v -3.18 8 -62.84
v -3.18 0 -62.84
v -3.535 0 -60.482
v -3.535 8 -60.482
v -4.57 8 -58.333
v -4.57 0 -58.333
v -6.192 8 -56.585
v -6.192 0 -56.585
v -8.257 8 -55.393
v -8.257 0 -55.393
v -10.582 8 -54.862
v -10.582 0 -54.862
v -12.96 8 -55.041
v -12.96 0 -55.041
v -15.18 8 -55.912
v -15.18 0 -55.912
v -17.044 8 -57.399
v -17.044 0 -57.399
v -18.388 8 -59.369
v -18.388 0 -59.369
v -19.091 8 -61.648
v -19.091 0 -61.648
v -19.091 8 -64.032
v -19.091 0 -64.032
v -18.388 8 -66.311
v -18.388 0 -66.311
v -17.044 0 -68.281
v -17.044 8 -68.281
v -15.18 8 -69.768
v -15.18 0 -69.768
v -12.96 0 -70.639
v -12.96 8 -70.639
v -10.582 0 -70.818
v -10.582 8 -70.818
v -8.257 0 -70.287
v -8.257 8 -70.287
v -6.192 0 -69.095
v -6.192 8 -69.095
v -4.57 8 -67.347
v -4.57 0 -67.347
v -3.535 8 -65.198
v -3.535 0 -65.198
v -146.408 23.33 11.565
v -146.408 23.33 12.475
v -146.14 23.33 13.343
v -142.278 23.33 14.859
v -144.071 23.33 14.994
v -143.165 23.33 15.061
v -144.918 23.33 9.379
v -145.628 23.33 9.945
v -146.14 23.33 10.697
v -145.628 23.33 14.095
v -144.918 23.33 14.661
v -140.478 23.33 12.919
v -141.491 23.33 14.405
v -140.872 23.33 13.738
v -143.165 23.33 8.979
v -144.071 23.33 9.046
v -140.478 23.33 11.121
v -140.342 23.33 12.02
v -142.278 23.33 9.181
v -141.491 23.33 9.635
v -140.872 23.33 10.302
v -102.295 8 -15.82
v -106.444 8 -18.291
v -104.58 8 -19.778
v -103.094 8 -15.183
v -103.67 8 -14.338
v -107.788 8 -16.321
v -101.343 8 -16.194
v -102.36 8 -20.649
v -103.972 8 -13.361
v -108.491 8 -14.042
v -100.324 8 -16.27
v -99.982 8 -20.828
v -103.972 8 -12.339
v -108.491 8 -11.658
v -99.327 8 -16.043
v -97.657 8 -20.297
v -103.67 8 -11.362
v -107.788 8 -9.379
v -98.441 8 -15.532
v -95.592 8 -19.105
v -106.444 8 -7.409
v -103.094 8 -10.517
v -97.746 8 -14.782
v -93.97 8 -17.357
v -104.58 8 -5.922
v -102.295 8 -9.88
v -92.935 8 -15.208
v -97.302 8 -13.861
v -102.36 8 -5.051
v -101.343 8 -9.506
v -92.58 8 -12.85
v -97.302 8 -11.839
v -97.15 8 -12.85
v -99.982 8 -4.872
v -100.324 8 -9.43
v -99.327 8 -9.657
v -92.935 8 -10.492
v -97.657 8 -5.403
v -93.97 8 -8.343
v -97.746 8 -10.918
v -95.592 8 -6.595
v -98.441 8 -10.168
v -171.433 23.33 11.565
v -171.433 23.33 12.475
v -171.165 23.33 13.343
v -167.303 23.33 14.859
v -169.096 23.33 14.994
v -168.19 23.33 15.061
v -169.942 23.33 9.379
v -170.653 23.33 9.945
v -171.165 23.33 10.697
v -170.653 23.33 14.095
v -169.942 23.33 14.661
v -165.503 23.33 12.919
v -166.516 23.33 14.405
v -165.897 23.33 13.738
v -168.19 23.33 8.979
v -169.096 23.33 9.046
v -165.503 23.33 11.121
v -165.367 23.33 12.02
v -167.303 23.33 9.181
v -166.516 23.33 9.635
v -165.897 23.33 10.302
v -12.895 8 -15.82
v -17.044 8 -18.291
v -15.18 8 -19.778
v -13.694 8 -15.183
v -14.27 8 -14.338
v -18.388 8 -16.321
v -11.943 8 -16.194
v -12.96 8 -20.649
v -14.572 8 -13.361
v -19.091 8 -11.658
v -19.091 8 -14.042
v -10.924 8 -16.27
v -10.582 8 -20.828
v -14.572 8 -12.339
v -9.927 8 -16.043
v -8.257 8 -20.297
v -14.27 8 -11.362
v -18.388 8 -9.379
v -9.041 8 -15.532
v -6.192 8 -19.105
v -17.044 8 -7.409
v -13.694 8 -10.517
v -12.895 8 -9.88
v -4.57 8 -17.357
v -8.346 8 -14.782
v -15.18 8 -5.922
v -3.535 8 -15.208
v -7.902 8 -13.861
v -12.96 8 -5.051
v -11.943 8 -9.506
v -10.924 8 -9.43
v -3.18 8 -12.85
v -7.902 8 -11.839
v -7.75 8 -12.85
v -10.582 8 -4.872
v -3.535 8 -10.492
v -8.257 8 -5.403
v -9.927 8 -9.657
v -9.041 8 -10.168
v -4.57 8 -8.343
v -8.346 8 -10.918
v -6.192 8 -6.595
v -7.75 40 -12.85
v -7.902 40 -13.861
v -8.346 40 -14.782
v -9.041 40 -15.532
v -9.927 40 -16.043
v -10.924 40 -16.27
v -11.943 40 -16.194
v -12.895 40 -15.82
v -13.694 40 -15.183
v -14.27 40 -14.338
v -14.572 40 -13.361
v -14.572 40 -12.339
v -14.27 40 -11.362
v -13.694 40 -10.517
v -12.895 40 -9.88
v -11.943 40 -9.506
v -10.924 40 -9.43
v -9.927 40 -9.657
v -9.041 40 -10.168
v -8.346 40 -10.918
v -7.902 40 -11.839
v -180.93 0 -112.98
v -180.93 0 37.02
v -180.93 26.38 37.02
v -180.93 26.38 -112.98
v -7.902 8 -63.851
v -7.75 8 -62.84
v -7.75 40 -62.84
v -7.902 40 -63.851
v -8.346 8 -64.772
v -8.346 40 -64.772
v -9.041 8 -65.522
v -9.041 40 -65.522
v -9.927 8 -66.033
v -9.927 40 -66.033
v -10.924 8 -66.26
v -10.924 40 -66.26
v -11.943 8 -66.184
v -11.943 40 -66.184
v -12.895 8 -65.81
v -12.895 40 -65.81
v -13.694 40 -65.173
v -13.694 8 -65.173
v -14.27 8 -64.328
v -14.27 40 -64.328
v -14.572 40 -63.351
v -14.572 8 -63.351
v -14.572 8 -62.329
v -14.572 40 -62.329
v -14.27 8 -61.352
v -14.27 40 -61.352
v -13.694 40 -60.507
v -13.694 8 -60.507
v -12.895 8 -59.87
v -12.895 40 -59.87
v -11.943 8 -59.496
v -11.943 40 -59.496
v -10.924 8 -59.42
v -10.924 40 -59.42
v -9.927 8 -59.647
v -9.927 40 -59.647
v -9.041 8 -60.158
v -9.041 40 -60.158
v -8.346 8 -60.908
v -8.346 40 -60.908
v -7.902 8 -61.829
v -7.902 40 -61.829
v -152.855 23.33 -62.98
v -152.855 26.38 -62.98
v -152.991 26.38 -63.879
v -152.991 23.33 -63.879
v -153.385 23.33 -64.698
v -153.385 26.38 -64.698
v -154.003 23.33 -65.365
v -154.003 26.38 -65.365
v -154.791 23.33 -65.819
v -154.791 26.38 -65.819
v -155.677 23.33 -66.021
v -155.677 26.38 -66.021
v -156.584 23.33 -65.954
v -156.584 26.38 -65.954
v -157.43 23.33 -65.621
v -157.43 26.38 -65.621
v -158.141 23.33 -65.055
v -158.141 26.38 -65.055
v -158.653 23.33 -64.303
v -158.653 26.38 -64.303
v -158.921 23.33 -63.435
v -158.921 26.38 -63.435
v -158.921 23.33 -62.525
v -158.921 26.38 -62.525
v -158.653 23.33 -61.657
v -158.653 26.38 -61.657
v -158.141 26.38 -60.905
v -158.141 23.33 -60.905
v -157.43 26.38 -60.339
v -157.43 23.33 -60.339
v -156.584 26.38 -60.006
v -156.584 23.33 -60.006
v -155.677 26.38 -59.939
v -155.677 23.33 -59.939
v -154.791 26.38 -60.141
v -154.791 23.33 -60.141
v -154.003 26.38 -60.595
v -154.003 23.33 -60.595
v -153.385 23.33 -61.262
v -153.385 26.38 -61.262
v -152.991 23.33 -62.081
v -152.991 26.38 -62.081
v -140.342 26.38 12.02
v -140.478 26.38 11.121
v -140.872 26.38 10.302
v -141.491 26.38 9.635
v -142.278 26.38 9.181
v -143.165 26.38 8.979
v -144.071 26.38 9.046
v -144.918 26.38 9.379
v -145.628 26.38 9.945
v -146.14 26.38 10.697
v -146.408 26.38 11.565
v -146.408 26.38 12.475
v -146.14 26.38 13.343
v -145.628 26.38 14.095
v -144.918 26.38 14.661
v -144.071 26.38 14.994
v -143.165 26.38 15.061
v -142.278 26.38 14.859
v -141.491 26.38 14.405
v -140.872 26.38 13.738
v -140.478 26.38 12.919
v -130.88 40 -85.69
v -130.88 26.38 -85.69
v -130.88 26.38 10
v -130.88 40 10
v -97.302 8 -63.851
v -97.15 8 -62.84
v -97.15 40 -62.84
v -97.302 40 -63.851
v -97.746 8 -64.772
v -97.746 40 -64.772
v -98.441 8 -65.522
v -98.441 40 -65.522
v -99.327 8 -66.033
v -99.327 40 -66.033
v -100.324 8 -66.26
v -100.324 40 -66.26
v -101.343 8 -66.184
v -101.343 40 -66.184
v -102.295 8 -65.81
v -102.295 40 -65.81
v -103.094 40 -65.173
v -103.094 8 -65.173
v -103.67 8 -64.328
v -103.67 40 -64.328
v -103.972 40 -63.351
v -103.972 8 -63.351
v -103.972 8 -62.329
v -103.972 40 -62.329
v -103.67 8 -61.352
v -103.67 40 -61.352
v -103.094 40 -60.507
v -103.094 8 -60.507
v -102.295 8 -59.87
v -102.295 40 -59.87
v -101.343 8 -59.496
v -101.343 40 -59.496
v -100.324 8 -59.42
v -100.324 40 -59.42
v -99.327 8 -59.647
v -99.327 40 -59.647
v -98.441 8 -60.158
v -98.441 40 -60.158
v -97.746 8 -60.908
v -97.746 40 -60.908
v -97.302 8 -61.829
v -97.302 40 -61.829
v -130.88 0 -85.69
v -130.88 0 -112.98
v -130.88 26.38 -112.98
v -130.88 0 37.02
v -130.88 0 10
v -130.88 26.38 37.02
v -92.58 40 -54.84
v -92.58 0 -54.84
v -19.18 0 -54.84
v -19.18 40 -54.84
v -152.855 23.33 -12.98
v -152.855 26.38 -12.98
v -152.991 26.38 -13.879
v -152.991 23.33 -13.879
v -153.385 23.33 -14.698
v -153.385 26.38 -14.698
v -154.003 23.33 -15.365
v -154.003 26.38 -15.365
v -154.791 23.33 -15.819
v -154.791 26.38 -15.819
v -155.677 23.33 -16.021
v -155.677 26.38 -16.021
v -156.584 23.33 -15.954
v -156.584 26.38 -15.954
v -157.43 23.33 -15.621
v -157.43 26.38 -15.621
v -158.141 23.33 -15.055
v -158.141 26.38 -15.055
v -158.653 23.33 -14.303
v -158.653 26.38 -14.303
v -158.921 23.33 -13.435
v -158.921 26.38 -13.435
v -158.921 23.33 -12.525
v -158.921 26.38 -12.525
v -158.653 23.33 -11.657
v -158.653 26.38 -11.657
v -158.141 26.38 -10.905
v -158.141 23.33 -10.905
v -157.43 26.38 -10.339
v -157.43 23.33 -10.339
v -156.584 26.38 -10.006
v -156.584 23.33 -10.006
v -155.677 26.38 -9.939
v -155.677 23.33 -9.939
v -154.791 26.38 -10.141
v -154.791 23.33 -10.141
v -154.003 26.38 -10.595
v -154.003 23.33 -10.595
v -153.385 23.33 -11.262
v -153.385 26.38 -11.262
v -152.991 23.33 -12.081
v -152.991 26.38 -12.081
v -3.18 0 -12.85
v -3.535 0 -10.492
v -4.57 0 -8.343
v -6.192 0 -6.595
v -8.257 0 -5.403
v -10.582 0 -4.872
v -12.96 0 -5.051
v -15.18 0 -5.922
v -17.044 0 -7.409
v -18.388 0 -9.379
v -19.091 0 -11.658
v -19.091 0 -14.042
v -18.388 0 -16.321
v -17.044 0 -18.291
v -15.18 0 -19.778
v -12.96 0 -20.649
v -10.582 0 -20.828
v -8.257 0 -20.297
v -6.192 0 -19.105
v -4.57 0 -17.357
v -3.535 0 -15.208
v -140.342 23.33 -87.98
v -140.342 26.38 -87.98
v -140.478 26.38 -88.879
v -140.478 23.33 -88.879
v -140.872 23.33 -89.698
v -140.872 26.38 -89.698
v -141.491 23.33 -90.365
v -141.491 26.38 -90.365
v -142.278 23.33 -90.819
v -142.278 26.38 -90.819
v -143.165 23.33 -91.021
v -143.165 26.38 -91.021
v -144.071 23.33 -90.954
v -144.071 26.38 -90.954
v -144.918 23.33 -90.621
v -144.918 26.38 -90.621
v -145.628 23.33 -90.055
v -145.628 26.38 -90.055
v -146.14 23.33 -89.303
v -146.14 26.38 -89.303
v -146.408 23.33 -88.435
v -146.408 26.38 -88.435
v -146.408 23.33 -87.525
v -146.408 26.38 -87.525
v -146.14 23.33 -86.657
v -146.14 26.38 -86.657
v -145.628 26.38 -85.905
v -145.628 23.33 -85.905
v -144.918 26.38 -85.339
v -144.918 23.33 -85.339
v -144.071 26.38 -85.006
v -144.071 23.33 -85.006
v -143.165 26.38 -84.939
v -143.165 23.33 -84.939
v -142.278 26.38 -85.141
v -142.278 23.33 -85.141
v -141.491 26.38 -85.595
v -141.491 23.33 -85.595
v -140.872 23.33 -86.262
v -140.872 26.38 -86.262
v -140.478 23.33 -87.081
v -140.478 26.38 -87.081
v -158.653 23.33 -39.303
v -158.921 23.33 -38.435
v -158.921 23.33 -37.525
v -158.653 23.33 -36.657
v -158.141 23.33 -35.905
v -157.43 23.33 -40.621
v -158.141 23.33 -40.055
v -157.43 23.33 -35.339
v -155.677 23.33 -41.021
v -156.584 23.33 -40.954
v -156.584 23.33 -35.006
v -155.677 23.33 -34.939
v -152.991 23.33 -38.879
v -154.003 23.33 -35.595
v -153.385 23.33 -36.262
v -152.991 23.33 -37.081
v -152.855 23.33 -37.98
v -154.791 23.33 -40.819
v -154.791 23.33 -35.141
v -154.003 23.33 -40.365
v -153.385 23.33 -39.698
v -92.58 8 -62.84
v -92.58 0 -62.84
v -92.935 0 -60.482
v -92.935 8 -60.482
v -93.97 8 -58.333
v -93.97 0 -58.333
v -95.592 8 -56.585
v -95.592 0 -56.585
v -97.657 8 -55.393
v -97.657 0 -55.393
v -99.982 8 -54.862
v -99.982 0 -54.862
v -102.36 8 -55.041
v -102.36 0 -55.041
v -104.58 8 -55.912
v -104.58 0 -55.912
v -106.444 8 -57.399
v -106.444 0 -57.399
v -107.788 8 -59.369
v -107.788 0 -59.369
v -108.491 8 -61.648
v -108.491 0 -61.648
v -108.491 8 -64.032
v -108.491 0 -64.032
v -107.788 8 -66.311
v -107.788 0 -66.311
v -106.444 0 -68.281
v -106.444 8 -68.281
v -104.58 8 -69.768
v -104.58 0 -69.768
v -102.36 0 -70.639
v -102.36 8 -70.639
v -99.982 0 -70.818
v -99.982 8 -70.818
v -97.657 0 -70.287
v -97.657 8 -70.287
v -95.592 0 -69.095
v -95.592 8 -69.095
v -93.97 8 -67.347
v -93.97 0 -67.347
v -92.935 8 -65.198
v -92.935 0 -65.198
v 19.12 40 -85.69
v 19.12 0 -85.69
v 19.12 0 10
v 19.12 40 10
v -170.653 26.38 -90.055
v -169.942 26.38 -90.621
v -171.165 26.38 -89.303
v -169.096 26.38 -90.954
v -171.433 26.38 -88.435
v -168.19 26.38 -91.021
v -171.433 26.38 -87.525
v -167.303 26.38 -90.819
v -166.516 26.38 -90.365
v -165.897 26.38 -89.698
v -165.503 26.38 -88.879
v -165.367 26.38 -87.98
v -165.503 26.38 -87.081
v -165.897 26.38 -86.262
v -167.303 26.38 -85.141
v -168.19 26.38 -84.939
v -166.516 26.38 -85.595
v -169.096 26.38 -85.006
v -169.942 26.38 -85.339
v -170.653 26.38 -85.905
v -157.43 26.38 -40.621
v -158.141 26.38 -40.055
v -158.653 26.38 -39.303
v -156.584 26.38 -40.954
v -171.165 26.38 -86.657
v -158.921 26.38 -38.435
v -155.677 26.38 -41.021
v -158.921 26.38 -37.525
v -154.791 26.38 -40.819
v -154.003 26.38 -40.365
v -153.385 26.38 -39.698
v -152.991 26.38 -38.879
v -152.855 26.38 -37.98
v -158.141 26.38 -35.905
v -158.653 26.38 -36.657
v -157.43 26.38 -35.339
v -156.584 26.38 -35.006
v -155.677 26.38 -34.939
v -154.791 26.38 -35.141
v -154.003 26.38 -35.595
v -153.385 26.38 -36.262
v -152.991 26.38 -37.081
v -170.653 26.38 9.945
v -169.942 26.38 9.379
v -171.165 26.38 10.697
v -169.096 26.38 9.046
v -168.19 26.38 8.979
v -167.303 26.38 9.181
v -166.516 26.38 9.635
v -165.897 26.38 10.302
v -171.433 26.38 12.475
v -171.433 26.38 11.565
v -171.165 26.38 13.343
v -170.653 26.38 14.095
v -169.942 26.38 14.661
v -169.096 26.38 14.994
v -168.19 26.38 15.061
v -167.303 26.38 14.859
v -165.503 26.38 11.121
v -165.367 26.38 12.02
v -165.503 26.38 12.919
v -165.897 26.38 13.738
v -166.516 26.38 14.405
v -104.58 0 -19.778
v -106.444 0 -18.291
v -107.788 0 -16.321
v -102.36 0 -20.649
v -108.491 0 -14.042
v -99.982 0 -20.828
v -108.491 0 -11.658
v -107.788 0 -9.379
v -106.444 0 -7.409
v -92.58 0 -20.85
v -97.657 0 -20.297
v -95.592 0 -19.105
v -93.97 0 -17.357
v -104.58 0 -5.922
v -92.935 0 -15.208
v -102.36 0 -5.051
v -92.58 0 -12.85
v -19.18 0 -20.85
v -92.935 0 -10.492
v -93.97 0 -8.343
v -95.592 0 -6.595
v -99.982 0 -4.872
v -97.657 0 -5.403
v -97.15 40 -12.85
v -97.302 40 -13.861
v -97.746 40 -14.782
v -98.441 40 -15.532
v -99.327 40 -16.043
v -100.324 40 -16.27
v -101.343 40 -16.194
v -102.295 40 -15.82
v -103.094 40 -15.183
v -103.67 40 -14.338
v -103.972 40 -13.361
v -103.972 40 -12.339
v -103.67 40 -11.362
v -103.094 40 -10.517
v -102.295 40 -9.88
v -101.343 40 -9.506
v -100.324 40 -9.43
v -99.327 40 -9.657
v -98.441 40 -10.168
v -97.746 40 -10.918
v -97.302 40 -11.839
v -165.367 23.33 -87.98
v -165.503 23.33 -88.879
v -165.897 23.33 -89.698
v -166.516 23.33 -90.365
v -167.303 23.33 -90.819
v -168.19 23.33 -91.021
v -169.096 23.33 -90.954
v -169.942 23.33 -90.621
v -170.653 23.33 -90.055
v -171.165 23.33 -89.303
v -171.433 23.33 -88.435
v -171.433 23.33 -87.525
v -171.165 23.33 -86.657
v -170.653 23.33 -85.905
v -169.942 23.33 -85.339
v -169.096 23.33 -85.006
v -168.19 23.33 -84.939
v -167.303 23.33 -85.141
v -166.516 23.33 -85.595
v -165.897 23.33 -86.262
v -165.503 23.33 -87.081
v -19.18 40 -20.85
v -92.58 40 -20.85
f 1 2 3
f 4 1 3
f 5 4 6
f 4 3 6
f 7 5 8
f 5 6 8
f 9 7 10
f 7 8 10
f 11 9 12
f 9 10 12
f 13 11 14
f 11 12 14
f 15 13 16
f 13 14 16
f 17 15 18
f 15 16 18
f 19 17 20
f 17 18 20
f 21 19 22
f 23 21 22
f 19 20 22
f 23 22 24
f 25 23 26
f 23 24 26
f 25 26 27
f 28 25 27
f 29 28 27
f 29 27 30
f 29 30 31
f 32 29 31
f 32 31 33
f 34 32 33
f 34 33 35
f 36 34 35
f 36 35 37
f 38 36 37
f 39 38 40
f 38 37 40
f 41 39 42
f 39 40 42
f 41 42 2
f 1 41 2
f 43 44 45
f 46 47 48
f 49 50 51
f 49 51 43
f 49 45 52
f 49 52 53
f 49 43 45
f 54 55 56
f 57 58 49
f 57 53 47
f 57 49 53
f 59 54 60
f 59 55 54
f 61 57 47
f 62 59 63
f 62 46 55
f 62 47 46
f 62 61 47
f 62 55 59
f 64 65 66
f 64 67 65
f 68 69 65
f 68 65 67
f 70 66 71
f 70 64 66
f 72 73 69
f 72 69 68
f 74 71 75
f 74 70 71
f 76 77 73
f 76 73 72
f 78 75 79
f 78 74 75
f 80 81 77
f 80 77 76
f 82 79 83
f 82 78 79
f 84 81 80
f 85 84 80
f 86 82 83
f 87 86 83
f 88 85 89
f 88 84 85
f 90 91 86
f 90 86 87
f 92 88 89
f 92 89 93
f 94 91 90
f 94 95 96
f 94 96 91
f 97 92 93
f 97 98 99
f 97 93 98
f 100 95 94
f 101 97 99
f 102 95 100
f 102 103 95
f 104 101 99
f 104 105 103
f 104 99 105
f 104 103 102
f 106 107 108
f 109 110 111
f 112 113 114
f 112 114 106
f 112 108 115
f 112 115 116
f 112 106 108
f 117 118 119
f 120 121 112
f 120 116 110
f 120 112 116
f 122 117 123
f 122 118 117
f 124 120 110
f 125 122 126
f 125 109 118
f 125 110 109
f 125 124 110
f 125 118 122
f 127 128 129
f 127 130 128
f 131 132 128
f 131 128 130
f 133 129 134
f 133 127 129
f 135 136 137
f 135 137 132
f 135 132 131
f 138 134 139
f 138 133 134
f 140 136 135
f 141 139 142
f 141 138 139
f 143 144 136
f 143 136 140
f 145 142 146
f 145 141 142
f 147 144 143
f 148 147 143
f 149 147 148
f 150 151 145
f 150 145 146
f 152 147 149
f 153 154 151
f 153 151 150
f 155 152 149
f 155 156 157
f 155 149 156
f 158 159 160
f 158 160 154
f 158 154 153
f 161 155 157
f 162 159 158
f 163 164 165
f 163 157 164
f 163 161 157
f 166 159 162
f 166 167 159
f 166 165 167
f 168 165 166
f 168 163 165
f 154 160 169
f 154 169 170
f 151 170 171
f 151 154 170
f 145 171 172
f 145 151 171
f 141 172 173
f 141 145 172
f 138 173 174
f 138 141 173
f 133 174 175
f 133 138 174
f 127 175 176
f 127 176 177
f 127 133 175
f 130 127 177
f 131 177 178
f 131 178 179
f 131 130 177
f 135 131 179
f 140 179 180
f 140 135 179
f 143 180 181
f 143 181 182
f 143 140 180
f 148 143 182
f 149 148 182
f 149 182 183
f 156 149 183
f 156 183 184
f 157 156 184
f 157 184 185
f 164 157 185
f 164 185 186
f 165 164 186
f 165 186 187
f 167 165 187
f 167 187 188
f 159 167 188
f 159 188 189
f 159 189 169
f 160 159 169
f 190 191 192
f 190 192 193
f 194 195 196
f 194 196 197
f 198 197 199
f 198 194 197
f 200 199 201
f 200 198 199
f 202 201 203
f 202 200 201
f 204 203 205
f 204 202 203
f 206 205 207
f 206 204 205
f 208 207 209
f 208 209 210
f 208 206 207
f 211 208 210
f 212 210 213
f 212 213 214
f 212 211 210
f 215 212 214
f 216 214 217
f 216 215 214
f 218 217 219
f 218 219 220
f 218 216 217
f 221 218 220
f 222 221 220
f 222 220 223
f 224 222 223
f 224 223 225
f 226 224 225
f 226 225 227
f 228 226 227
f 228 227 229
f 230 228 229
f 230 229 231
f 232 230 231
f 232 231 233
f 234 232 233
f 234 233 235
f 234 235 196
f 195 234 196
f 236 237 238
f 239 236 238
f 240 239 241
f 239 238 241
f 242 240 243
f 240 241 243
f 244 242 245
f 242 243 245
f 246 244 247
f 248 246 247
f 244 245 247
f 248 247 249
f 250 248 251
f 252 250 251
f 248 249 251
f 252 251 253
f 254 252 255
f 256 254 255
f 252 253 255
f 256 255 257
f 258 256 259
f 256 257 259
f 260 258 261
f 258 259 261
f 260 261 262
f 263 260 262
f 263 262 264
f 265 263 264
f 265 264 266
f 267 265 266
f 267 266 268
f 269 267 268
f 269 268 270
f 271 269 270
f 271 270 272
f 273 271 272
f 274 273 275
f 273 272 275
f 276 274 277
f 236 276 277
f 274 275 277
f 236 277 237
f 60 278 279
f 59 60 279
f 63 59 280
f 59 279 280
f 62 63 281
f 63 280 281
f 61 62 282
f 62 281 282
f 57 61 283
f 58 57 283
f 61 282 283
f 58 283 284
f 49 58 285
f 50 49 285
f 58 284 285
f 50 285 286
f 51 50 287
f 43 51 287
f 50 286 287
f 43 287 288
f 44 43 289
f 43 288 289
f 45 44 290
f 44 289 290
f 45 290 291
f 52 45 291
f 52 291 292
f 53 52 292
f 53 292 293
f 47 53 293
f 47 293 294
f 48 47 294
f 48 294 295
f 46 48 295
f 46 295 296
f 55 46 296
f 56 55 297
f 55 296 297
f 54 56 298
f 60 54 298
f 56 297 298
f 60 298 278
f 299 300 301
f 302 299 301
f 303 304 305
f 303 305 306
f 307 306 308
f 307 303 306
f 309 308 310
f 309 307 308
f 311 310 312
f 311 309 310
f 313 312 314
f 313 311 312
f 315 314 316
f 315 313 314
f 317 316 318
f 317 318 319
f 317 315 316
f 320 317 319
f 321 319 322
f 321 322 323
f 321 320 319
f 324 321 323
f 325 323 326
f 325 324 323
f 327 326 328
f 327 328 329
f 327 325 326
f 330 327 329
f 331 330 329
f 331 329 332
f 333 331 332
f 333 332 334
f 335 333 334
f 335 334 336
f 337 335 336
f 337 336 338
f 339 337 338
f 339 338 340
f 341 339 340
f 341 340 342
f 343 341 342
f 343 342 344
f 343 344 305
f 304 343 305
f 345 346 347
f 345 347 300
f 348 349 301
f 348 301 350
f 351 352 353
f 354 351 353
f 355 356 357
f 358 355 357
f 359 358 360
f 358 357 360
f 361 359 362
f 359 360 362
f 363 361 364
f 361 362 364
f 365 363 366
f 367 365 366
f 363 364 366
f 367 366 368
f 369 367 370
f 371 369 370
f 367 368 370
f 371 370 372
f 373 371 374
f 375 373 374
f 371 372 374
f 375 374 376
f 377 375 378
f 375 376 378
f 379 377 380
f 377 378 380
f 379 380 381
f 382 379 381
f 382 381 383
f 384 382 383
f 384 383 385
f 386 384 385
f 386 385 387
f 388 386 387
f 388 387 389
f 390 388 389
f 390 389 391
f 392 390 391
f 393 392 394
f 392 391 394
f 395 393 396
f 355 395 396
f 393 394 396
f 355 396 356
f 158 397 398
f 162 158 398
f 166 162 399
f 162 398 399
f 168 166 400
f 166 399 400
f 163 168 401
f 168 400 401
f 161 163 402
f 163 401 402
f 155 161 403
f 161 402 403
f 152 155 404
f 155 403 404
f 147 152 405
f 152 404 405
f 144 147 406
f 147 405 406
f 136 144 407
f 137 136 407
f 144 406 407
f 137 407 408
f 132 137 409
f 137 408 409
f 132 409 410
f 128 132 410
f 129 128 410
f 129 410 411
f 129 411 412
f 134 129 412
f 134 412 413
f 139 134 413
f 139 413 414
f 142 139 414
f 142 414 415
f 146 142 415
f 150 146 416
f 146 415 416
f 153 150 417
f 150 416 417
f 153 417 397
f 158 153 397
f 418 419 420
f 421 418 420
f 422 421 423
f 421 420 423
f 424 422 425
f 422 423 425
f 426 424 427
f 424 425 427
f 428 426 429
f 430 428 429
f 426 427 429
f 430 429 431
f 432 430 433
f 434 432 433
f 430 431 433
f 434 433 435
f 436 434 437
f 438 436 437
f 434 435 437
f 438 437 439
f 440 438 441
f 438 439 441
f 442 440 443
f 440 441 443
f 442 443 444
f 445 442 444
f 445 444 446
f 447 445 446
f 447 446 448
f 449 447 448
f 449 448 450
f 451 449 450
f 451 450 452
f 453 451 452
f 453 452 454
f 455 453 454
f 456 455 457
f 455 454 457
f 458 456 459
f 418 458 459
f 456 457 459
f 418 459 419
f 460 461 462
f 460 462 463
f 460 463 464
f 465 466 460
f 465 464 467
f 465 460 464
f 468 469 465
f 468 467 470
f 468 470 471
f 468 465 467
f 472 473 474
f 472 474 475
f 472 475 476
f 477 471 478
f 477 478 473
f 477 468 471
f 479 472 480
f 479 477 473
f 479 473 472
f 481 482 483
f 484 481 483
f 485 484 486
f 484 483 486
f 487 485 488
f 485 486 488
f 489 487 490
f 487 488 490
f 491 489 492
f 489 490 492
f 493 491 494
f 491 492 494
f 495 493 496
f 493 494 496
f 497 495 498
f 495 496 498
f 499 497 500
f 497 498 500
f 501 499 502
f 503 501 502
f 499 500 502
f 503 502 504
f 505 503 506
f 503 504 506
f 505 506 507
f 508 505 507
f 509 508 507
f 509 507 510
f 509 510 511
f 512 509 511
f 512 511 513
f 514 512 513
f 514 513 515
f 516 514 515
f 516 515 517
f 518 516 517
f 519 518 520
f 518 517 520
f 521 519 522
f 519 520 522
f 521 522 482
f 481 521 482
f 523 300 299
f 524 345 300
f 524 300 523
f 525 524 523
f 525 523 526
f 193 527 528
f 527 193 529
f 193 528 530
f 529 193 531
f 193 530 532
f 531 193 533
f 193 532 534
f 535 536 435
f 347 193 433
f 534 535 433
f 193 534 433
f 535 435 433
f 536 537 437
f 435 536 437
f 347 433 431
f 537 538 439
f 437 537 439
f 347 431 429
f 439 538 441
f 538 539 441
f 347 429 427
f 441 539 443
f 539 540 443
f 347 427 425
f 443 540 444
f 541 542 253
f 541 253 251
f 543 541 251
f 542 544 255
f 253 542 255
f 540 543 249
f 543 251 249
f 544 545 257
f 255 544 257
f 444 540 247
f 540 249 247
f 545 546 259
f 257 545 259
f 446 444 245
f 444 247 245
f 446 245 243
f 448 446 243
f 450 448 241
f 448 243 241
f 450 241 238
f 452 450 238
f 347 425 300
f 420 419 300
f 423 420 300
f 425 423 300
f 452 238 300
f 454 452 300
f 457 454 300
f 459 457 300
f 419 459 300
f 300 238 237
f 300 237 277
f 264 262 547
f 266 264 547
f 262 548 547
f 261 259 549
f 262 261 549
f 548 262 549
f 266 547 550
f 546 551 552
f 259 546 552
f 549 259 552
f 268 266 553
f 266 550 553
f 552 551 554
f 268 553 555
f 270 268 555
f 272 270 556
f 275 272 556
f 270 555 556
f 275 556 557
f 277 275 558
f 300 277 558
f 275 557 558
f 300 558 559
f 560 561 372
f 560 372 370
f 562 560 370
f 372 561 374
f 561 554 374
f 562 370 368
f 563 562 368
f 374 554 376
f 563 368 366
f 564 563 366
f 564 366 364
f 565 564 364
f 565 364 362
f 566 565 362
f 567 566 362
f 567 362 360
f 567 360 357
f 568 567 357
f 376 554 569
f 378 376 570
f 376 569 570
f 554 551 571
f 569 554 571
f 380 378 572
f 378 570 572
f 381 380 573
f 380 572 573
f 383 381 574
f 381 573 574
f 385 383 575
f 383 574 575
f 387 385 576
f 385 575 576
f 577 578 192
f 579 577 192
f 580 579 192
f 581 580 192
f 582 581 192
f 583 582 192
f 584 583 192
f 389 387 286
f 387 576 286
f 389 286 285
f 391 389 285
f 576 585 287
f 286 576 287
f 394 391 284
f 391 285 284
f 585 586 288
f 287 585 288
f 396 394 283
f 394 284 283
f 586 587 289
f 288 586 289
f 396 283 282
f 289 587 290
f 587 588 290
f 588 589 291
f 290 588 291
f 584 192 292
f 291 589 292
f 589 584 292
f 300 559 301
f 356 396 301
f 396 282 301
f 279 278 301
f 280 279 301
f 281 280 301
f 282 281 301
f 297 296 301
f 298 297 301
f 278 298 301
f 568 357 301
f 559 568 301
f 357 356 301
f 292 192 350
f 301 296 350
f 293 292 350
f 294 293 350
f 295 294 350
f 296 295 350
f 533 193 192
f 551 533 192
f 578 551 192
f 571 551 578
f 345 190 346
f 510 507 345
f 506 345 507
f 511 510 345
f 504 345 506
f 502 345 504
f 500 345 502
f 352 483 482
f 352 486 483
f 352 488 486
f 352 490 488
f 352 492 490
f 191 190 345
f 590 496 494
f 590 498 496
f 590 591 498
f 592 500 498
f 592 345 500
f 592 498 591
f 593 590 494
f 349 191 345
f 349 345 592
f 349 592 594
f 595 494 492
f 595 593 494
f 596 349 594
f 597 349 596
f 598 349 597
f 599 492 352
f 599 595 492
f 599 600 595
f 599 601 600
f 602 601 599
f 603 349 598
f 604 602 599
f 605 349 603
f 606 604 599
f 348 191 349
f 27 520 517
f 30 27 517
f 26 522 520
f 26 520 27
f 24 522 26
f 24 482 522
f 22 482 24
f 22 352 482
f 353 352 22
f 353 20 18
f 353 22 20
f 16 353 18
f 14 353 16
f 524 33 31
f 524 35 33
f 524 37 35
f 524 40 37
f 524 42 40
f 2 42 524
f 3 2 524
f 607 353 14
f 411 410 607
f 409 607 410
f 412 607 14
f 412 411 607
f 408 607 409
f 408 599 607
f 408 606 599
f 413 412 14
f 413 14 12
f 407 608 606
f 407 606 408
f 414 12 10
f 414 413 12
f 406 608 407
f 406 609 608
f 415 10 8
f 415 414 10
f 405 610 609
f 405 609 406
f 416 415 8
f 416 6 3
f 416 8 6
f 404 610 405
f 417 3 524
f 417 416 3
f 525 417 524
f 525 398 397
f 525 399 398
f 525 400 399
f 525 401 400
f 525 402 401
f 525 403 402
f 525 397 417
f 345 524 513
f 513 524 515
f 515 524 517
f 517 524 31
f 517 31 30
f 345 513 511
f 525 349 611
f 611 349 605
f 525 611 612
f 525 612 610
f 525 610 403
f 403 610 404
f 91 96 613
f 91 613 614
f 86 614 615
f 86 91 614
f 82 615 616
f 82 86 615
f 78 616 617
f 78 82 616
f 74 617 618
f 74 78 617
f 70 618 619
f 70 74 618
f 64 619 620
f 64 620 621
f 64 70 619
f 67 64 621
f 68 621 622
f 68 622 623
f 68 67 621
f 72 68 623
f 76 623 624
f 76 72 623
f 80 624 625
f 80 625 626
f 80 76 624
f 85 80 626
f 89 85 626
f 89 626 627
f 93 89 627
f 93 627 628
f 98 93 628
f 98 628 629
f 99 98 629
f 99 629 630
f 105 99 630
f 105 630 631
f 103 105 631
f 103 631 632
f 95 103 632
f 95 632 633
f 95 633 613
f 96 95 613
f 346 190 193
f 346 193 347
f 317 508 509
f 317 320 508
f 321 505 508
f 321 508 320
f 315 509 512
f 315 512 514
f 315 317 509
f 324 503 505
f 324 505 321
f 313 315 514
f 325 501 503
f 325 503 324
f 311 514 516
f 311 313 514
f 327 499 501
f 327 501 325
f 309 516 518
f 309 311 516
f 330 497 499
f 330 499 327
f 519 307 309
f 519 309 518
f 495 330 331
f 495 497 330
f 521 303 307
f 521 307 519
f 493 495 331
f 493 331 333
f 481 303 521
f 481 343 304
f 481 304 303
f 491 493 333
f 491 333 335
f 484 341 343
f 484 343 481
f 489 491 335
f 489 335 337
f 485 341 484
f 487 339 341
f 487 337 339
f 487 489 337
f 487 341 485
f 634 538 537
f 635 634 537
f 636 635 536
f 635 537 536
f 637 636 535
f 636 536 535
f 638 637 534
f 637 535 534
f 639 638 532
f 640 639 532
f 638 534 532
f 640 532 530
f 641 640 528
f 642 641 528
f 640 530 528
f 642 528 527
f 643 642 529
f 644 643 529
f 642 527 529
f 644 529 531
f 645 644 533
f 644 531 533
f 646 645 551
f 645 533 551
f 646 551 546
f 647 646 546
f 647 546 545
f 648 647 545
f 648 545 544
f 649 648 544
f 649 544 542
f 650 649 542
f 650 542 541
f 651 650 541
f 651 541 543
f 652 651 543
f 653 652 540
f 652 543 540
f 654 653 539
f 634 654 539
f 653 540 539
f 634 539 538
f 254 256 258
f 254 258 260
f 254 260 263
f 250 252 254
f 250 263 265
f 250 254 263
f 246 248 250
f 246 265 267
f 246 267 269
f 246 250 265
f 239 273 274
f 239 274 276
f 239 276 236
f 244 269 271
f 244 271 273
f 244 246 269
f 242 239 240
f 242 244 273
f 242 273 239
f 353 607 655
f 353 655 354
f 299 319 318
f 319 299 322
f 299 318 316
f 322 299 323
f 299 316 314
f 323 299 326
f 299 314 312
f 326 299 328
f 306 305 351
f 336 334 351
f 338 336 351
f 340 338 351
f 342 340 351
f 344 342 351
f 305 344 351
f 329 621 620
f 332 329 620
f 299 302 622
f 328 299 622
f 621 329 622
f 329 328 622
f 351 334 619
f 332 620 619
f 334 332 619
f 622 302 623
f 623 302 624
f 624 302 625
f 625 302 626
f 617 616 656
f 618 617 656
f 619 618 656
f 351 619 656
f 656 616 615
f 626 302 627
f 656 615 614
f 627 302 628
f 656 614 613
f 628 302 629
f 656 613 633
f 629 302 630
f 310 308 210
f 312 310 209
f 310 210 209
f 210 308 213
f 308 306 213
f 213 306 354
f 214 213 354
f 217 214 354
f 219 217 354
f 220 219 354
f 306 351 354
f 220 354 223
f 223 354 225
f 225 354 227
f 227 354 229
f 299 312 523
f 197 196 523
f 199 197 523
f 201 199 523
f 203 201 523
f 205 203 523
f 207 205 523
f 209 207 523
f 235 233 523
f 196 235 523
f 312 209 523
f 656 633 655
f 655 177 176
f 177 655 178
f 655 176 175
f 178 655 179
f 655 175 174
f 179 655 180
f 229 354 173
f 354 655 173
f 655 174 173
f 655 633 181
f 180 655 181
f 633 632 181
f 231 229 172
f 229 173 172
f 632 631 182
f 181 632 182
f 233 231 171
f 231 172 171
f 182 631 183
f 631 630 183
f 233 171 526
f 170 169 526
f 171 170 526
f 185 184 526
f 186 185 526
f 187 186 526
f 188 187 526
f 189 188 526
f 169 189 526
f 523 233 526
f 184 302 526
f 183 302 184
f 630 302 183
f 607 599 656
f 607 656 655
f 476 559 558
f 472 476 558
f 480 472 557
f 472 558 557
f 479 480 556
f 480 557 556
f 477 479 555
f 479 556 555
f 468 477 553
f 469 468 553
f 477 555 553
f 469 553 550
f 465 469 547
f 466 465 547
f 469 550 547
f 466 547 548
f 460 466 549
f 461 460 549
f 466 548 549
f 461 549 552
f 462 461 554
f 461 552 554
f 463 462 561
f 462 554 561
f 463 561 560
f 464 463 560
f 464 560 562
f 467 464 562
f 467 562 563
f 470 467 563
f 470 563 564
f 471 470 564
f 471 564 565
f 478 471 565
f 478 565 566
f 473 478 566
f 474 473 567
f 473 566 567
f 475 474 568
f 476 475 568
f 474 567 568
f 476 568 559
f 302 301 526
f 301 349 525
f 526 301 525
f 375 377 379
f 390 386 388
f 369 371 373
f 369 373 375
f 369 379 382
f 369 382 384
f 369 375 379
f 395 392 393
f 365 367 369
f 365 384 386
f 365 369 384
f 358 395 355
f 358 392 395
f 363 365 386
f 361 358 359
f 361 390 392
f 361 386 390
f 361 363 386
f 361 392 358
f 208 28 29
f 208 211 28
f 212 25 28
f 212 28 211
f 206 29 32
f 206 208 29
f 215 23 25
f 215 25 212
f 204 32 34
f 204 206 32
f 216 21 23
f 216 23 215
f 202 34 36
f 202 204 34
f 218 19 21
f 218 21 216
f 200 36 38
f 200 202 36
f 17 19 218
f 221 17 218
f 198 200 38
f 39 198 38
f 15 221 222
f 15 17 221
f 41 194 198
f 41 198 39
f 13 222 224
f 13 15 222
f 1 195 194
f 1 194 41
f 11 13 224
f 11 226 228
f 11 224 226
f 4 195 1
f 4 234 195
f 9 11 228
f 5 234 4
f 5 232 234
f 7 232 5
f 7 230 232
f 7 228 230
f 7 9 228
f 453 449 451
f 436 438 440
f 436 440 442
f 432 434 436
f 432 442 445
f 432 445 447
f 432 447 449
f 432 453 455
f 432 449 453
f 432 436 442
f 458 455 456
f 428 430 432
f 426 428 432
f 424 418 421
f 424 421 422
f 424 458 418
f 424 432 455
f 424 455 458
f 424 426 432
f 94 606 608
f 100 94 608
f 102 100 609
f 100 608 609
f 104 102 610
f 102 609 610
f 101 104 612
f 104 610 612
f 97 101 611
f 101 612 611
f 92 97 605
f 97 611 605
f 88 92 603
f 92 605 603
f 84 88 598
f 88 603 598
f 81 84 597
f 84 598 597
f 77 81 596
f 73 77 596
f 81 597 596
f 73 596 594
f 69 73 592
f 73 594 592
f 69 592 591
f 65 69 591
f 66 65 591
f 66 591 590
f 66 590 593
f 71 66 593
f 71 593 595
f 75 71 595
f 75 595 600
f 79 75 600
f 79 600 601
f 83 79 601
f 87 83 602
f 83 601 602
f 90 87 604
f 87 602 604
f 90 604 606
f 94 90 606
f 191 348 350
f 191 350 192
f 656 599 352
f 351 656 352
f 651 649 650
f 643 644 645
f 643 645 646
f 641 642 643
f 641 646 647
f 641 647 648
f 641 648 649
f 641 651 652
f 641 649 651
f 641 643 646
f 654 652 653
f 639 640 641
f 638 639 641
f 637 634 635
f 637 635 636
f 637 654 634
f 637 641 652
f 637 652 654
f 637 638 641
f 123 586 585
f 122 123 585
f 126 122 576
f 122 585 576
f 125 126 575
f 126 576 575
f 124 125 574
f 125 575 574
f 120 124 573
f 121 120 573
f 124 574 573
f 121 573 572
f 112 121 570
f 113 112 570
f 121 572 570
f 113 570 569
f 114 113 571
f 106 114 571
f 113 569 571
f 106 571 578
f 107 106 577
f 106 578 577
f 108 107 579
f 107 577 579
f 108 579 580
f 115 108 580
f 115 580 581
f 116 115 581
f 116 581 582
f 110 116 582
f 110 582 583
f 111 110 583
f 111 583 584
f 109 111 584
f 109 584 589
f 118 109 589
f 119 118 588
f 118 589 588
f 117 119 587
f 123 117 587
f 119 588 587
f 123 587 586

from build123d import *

# Parameters (mm, degrees)
SKETCH8_W           = 131.76
SKETCH8_H           = 95.69
SKETCH8_R           = 3.43
SKETCH8_W_2         = 73.4
SKETCH8_H_2         = 33.99
BOSS_EXTRUDE4_DEPTH = 40
SKETCH9_R           = 8
CUT_EXTRUDE2_DEPTH  = 8
SKETCH12_W          = 9.12
SKETCH12_H          = 95.69
BOSS_EXTRUDE5_DEPTH = 40
BOSS_EXTRUDE6_DEPTH = 26.38
SKETCH15_R          = 3.05
CUT_EXTRUDE4_DEPTH  = 3.05
SKETCH14_R          = 3.05
CUT_EXTRUDE3_DEPTH  = 3.05


with BuildPart() as part:
    # Sketch8 → Boss-Extrude4 (new body)
    with BuildSketch(Plane(origin=(0, 0, 0), x_dir=(1, 0, 0), z_dir=(0, 1, 0))):
        with Locations((-55.88, 37.845)):
            Rectangle(SKETCH8_W, SKETCH8_H)
        with Locations((-100.58, 12.85)):
            Circle(SKETCH8_R, mode=Mode.SUBTRACT)
        with Locations((-100.58, 62.84)):
            Circle(SKETCH8_R, mode=Mode.SUBTRACT)
        with Locations((-11.18, 62.84)):
            Circle(SKETCH8_R, mode=Mode.SUBTRACT)
        with Locations((-11.18, 12.85)):
            Circle(SKETCH8_R, mode=Mode.SUBTRACT)
        with Locations((-55.88, 37.845)):
            Rectangle(SKETCH8_W_2, SKETCH8_H_2, mode=Mode.SUBTRACT)
    extrude(amount=BOSS_EXTRUDE4_DEPTH)

    # Sketch9 → Cut-Extrude2 (cut)
    with BuildSketch(Plane.XZ):
        with Locations((-100.58, -12.85)):
            Circle(SKETCH9_R)
        with Locations((-11.18, -12.85)):
            Circle(SKETCH9_R)
        with Locations((-11.18, -62.84)):
            Circle(SKETCH9_R)
        with Locations((-100.58, -62.84)):
            Circle(SKETCH9_R)
    extrude(amount=-CUT_EXTRUDE2_DEPTH, mode=Mode.SUBTRACT)

    # Sketch12 → Boss-Extrude5 (add)
    with BuildSketch(Plane.XZ):
        with Locations((-126.32, -37.845)):
            Rectangle(SKETCH12_W, SKETCH12_H)
        with Locations((14.56, -37.845)):
            Rectangle(SKETCH12_W, SKETCH12_H)
    extrude(amount=-BOSS_EXTRUDE5_DEPTH)

    # Sketch13 → Boss-Extrude6 (add)
    with BuildSketch(Plane.XZ):
        Polygon((-130.88, -85.69), (-130.88, 10), (-130.88, 37.02), (-180.93, 37.02), (-180.93, -112.98), (-130.88, -112.98), align=None)
    extrude(amount=-BOSS_EXTRUDE6_DEPTH)

    # Sketch15 → Cut-Extrude4 (cut)
    with BuildSketch(Plane(origin=(0, 26.38, 0), x_dir=(1, 0, 0), z_dir=(0, 1, 0))):
        with Locations((-168.4175, 87.98)):
            Circle(SKETCH15_R)
        with Locations((-143.3925, 87.98)):
            Circle(SKETCH15_R)
        with Locations((-155.905, 62.98)):
            Circle(SKETCH15_R)
        with Locations((-155.905, 37.98)):
            Circle(SKETCH15_R)
        with Locations((-155.905, 12.98)):
            Circle(SKETCH15_R)
        with Locations((-168.4175, -12.02)):
            Circle(SKETCH15_R)
        with Locations((-143.3925, -12.02)):
            Circle(SKETCH15_R)
    extrude(amount=-CUT_EXTRUDE4_DEPTH, mode=Mode.SUBTRACT)

    # Sketch14 → Cut-Extrude3 (cut)
    with BuildSketch(Plane(origin=(0, 26.38, 0), x_dir=(1, 0, 0), z_dir=(0, 1, 0))):
        with Locations((-105.88, -22.5125)):
            Circle(SKETCH14_R)
        with Locations((-105.88, -47.5375)):
            Circle(SKETCH14_R)
        with BuildLine():
            ThreePointArc((-77.83, -35.025), (-80.88, -31.975), (-83.93, -35.025))
            Line((-83.93, -35.025), (-77.83, -35.025))
        make_face()
        with BuildLine():
            Line((-77.83, -35.025), (-83.93, -35.025))
            ThreePointArc((-83.93, -35.025), (-80.88, -38.075), (-77.83, -35.025))
        make_face()
        with BuildLine():
            ThreePointArc((-52.83, -22.5125), (-53.723324317, -20.355824317), (-55.88, -19.4625))
            Line((-55.88, -19.4625), (-55.88, -25.5625))
            ThreePointArc((-55.88, -25.5625), (-53.723324317, -24.669175683), (-52.83, -22.5125))
        make_face()
        with BuildLine():
            Line((-55.88, -25.5625), (-55.88, -19.4625))
            ThreePointArc((-55.88, -19.4625), (-58.93, -22.5125), (-55.88, -25.5625))
        make_face()
        with BuildLine():
            ThreePointArc((-55.88, -44.4875), (-58.93, -47.5375), (-55.88, -50.5875))
            Line((-55.88, -50.5875), (-55.88, -44.4875))
        make_face()
        with BuildLine():
            Line((-55.88, -44.4875), (-55.88, -50.5875))
            ThreePointArc((-55.88, -50.5875), (-53.723324317, -49.694175683), (-52.83, -47.5375))
            ThreePointArc((-52.83, -47.5375), (-53.723324317, -45.380824317), (-55.88, -44.4875))
        make_face()
        with BuildLine():
            ThreePointArc((-33.93, -35.025), (-33.036675683, -37.181675683), (-30.88, -38.075))
            Line((-30.88, -38.075), (-30.88, -35.025))
            Line((-30.88, -35.025), (-33.93, -35.025))
        make_face()
        with BuildLine():
            Line((-30.88, -35.025), (-30.88, -38.075))
            ThreePointArc((-30.88, -38.075), (-28.723324317, -37.181675683), (-27.83, -35.025))
            Line((-27.83, -35.025), (-30.88, -35.025))
        make_face()
        with BuildLine():
            ThreePointArc((-27.83, -35.025), (-28.723324317, -32.868324317), (-30.88, -31.975))
            Line((-30.88, -31.975), (-30.88, -35.025))
            Line((-30.88, -35.025), (-27.83, -35.025))
        make_face()
        with BuildLine():
            Line((-30.88, -35.025), (-30.88, -31.975))
            ThreePointArc((-30.88, -31.975), (-33.036675683, -32.868324317), (-33.93, -35.025))
            Line((-33.93, -35.025), (-30.88, -35.025))
        make_face()
        with BuildLine():
            ThreePointArc((-2.83, -22.5125), (-3.723324317, -20.355824317), (-5.88, -19.4625))
            Line((-5.88, -19.4625), (-5.88, -25.5625))
            ThreePointArc((-5.88, -25.5625), (-3.723324317, -24.669175683), (-2.83, -22.5125))
        make_face()
        with BuildLine():
            Line((-5.88, -25.5625), (-5.88, -19.4625))
            ThreePointArc((-5.88, -19.4625), (-8.93, -22.5125), (-5.88, -25.5625))
        make_face()
        with BuildLine():
            ThreePointArc((-5.88, -44.4875), (-8.93, -47.5375), (-5.88, -50.5875))
            Line((-5.88, -50.5875), (-5.88, -44.4875))
        make_face()
        with BuildLine():
            Line((-5.88, -44.4875), (-5.88, -50.5875))
            ThreePointArc((-5.88, -50.5875), (-3.723324317, -49.694175683), (-2.83, -47.5375))
            ThreePointArc((-2.83, -47.5375), (-3.723324317, -45.380824317), (-5.88, -44.4875))
        make_face()
    extrude(amount=-CUT_EXTRUDE3_DEPTH, mode=Mode.SUBTRACT)


solid = part.part
